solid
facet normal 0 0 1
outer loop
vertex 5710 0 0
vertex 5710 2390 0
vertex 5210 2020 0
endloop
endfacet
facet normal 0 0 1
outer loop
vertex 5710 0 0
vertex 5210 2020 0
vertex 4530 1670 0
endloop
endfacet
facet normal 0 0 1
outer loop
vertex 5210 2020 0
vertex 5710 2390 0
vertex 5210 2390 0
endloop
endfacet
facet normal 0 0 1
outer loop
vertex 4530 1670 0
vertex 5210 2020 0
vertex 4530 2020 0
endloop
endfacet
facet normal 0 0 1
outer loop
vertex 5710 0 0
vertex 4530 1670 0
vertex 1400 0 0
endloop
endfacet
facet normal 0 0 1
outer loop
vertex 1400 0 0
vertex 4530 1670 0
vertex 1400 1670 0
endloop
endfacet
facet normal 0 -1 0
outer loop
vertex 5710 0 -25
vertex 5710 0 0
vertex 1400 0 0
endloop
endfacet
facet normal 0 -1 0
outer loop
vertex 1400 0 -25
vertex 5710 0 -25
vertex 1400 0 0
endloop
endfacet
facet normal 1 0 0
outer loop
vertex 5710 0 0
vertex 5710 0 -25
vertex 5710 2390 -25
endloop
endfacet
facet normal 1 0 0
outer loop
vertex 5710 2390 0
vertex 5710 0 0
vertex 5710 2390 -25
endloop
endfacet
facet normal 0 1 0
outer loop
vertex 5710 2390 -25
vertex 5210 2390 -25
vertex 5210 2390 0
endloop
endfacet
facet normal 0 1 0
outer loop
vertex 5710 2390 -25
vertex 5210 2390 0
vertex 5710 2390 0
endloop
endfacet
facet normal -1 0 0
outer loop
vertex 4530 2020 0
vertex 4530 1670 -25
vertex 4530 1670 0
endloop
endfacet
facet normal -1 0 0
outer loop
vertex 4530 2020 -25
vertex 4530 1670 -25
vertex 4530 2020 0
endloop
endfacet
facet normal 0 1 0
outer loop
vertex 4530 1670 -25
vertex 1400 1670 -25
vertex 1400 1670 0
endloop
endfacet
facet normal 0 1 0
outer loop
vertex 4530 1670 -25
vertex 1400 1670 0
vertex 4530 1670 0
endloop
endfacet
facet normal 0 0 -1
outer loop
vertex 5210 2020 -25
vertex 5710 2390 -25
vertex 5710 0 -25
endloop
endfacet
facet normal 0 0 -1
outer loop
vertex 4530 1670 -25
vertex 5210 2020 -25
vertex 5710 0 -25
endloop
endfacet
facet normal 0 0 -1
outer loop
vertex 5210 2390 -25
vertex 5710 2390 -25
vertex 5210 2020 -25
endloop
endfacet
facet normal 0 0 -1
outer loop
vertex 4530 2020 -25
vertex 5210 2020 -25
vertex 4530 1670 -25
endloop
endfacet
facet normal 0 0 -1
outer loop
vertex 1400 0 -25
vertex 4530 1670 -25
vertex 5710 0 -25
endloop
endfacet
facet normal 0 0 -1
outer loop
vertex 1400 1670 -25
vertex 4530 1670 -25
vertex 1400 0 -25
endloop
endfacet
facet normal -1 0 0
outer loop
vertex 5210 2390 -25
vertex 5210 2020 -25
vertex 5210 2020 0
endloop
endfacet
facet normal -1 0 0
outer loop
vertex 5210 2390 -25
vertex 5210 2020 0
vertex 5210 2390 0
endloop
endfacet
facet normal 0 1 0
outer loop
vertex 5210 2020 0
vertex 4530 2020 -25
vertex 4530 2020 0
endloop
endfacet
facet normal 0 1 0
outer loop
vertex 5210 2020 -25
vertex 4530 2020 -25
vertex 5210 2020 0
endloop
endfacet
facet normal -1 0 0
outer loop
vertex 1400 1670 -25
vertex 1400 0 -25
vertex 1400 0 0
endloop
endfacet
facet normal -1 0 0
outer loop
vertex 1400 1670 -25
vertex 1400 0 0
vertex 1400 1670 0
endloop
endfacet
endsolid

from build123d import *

# Parameters (mm, degrees)
TABAN_FLAN_1_DEPTH         = 25
KES_EKSTR_ZYON1_DEPTH      = 6508.676543898
KES_EKSTR_ZYON1_DEPTH_BACK = 6508.676543898
IZIM7_W                    = 1400
IZIM7_H                    = 1895
IZIM7_W_2                  = 310
IZIM7_H_2                  = 495
KES_EKSTR_ZYON2_DEPTH      = 6508.676543898
KES_EKSTR_ZYON2_DEPTH_BACK = 6508.676543898
IZIM8_W                    = 292
IZIM8_H                    = 2515
KES_EKSTR_ZYON3_DEPTH      = 6240.38698912
KES_EKSTR_ZYON3_DEPTH_BACK = 6240.38698912
IZIM10_W                   = 2900
IZIM10_H                   = 350
KES_EKSTR_ZYON4_DEPTH      = 6240.38698912
KES_EKSTR_ZYON4_DEPTH_BACK = 6240.38698912


# Sheet-metal steps are written as plain solids
with BuildPart() as part:
    # Çizim1 → Taban-Flanş1 (new body)
    with BuildSketch(Plane.XY):
        Polygon((0, 0), (0, 1895), (2935, 1895), (2935, 2020), (4900, 2020), (4900, 2515), (6002, 2515), (6002, 0), align=None)
    extrude(amount=-TABAN_FLAN_1_DEPTH)

    # Çizim7 → Kes-Ekstrüzyon1 (cut, two sides: drawn at the far end of the back side and taken through both)
    with BuildSketch(Plane.XY.offset(-KES_EKSTR_ZYON1_DEPTH_BACK)):
        with Locations((700, 947.5)):
            Rectangle(IZIM7_W, IZIM7_H)
        with Locations((5055, 2267.5)):
            Rectangle(IZIM7_W_2, IZIM7_H_2)
    extrude(amount=KES_EKSTR_ZYON1_DEPTH + KES_EKSTR_ZYON1_DEPTH_BACK, mode=Mode.SUBTRACT)

    # Çizim8 → Kes-Ekstrüzyon2 (cut, two sides: drawn at the far end of the back side and taken through both)
    with BuildSketch(Plane.XY.offset(-KES_EKSTR_ZYON2_DEPTH_BACK)):
        with Locations((5856, 1257.5)):
            Rectangle(IZIM8_W, IZIM8_H)
    extrude(amount=KES_EKSTR_ZYON2_DEPTH + KES_EKSTR_ZYON2_DEPTH_BACK, mode=Mode.SUBTRACT)

    # Çizim10 → Kes-Ekstrüzyon3 (cut, two sides: drawn at the far end of the back side and taken through both)
    with BuildSketch(Plane.XY.offset(-KES_EKSTR_ZYON3_DEPTH_BACK)):
        with Locations((2850, 1845)):
            Rectangle(IZIM10_W, IZIM10_H)
    extrude(amount=KES_EKSTR_ZYON3_DEPTH + KES_EKSTR_ZYON3_DEPTH_BACK, mode=Mode.SUBTRACT)

    # Çizim11 → Kes-Ekstrüzyon4 (cut, two sides: drawn at the far end of the back side and taken through both)
    with BuildSketch(Plane.XY.offset(-KES_EKSTR_ZYON4_DEPTH_BACK)):
        Polygon((4300, 1670), (4530, 1670), (4530, 2020), (5210, 2020), (5210, 2390), (5710, 2390), (5778.630385148, 2406.496682207), (5749.815338653, 2697.266696836), (5189.231706845, 2697.266696836), (4530, 2199.552257381), (4300, 2199.552257381), align=None)
    extrude(amount=KES_EKSTR_ZYON4_DEPTH + KES_EKSTR_ZYON4_DEPTH_BACK, mode=Mode.SUBTRACT)


solid = part.part
